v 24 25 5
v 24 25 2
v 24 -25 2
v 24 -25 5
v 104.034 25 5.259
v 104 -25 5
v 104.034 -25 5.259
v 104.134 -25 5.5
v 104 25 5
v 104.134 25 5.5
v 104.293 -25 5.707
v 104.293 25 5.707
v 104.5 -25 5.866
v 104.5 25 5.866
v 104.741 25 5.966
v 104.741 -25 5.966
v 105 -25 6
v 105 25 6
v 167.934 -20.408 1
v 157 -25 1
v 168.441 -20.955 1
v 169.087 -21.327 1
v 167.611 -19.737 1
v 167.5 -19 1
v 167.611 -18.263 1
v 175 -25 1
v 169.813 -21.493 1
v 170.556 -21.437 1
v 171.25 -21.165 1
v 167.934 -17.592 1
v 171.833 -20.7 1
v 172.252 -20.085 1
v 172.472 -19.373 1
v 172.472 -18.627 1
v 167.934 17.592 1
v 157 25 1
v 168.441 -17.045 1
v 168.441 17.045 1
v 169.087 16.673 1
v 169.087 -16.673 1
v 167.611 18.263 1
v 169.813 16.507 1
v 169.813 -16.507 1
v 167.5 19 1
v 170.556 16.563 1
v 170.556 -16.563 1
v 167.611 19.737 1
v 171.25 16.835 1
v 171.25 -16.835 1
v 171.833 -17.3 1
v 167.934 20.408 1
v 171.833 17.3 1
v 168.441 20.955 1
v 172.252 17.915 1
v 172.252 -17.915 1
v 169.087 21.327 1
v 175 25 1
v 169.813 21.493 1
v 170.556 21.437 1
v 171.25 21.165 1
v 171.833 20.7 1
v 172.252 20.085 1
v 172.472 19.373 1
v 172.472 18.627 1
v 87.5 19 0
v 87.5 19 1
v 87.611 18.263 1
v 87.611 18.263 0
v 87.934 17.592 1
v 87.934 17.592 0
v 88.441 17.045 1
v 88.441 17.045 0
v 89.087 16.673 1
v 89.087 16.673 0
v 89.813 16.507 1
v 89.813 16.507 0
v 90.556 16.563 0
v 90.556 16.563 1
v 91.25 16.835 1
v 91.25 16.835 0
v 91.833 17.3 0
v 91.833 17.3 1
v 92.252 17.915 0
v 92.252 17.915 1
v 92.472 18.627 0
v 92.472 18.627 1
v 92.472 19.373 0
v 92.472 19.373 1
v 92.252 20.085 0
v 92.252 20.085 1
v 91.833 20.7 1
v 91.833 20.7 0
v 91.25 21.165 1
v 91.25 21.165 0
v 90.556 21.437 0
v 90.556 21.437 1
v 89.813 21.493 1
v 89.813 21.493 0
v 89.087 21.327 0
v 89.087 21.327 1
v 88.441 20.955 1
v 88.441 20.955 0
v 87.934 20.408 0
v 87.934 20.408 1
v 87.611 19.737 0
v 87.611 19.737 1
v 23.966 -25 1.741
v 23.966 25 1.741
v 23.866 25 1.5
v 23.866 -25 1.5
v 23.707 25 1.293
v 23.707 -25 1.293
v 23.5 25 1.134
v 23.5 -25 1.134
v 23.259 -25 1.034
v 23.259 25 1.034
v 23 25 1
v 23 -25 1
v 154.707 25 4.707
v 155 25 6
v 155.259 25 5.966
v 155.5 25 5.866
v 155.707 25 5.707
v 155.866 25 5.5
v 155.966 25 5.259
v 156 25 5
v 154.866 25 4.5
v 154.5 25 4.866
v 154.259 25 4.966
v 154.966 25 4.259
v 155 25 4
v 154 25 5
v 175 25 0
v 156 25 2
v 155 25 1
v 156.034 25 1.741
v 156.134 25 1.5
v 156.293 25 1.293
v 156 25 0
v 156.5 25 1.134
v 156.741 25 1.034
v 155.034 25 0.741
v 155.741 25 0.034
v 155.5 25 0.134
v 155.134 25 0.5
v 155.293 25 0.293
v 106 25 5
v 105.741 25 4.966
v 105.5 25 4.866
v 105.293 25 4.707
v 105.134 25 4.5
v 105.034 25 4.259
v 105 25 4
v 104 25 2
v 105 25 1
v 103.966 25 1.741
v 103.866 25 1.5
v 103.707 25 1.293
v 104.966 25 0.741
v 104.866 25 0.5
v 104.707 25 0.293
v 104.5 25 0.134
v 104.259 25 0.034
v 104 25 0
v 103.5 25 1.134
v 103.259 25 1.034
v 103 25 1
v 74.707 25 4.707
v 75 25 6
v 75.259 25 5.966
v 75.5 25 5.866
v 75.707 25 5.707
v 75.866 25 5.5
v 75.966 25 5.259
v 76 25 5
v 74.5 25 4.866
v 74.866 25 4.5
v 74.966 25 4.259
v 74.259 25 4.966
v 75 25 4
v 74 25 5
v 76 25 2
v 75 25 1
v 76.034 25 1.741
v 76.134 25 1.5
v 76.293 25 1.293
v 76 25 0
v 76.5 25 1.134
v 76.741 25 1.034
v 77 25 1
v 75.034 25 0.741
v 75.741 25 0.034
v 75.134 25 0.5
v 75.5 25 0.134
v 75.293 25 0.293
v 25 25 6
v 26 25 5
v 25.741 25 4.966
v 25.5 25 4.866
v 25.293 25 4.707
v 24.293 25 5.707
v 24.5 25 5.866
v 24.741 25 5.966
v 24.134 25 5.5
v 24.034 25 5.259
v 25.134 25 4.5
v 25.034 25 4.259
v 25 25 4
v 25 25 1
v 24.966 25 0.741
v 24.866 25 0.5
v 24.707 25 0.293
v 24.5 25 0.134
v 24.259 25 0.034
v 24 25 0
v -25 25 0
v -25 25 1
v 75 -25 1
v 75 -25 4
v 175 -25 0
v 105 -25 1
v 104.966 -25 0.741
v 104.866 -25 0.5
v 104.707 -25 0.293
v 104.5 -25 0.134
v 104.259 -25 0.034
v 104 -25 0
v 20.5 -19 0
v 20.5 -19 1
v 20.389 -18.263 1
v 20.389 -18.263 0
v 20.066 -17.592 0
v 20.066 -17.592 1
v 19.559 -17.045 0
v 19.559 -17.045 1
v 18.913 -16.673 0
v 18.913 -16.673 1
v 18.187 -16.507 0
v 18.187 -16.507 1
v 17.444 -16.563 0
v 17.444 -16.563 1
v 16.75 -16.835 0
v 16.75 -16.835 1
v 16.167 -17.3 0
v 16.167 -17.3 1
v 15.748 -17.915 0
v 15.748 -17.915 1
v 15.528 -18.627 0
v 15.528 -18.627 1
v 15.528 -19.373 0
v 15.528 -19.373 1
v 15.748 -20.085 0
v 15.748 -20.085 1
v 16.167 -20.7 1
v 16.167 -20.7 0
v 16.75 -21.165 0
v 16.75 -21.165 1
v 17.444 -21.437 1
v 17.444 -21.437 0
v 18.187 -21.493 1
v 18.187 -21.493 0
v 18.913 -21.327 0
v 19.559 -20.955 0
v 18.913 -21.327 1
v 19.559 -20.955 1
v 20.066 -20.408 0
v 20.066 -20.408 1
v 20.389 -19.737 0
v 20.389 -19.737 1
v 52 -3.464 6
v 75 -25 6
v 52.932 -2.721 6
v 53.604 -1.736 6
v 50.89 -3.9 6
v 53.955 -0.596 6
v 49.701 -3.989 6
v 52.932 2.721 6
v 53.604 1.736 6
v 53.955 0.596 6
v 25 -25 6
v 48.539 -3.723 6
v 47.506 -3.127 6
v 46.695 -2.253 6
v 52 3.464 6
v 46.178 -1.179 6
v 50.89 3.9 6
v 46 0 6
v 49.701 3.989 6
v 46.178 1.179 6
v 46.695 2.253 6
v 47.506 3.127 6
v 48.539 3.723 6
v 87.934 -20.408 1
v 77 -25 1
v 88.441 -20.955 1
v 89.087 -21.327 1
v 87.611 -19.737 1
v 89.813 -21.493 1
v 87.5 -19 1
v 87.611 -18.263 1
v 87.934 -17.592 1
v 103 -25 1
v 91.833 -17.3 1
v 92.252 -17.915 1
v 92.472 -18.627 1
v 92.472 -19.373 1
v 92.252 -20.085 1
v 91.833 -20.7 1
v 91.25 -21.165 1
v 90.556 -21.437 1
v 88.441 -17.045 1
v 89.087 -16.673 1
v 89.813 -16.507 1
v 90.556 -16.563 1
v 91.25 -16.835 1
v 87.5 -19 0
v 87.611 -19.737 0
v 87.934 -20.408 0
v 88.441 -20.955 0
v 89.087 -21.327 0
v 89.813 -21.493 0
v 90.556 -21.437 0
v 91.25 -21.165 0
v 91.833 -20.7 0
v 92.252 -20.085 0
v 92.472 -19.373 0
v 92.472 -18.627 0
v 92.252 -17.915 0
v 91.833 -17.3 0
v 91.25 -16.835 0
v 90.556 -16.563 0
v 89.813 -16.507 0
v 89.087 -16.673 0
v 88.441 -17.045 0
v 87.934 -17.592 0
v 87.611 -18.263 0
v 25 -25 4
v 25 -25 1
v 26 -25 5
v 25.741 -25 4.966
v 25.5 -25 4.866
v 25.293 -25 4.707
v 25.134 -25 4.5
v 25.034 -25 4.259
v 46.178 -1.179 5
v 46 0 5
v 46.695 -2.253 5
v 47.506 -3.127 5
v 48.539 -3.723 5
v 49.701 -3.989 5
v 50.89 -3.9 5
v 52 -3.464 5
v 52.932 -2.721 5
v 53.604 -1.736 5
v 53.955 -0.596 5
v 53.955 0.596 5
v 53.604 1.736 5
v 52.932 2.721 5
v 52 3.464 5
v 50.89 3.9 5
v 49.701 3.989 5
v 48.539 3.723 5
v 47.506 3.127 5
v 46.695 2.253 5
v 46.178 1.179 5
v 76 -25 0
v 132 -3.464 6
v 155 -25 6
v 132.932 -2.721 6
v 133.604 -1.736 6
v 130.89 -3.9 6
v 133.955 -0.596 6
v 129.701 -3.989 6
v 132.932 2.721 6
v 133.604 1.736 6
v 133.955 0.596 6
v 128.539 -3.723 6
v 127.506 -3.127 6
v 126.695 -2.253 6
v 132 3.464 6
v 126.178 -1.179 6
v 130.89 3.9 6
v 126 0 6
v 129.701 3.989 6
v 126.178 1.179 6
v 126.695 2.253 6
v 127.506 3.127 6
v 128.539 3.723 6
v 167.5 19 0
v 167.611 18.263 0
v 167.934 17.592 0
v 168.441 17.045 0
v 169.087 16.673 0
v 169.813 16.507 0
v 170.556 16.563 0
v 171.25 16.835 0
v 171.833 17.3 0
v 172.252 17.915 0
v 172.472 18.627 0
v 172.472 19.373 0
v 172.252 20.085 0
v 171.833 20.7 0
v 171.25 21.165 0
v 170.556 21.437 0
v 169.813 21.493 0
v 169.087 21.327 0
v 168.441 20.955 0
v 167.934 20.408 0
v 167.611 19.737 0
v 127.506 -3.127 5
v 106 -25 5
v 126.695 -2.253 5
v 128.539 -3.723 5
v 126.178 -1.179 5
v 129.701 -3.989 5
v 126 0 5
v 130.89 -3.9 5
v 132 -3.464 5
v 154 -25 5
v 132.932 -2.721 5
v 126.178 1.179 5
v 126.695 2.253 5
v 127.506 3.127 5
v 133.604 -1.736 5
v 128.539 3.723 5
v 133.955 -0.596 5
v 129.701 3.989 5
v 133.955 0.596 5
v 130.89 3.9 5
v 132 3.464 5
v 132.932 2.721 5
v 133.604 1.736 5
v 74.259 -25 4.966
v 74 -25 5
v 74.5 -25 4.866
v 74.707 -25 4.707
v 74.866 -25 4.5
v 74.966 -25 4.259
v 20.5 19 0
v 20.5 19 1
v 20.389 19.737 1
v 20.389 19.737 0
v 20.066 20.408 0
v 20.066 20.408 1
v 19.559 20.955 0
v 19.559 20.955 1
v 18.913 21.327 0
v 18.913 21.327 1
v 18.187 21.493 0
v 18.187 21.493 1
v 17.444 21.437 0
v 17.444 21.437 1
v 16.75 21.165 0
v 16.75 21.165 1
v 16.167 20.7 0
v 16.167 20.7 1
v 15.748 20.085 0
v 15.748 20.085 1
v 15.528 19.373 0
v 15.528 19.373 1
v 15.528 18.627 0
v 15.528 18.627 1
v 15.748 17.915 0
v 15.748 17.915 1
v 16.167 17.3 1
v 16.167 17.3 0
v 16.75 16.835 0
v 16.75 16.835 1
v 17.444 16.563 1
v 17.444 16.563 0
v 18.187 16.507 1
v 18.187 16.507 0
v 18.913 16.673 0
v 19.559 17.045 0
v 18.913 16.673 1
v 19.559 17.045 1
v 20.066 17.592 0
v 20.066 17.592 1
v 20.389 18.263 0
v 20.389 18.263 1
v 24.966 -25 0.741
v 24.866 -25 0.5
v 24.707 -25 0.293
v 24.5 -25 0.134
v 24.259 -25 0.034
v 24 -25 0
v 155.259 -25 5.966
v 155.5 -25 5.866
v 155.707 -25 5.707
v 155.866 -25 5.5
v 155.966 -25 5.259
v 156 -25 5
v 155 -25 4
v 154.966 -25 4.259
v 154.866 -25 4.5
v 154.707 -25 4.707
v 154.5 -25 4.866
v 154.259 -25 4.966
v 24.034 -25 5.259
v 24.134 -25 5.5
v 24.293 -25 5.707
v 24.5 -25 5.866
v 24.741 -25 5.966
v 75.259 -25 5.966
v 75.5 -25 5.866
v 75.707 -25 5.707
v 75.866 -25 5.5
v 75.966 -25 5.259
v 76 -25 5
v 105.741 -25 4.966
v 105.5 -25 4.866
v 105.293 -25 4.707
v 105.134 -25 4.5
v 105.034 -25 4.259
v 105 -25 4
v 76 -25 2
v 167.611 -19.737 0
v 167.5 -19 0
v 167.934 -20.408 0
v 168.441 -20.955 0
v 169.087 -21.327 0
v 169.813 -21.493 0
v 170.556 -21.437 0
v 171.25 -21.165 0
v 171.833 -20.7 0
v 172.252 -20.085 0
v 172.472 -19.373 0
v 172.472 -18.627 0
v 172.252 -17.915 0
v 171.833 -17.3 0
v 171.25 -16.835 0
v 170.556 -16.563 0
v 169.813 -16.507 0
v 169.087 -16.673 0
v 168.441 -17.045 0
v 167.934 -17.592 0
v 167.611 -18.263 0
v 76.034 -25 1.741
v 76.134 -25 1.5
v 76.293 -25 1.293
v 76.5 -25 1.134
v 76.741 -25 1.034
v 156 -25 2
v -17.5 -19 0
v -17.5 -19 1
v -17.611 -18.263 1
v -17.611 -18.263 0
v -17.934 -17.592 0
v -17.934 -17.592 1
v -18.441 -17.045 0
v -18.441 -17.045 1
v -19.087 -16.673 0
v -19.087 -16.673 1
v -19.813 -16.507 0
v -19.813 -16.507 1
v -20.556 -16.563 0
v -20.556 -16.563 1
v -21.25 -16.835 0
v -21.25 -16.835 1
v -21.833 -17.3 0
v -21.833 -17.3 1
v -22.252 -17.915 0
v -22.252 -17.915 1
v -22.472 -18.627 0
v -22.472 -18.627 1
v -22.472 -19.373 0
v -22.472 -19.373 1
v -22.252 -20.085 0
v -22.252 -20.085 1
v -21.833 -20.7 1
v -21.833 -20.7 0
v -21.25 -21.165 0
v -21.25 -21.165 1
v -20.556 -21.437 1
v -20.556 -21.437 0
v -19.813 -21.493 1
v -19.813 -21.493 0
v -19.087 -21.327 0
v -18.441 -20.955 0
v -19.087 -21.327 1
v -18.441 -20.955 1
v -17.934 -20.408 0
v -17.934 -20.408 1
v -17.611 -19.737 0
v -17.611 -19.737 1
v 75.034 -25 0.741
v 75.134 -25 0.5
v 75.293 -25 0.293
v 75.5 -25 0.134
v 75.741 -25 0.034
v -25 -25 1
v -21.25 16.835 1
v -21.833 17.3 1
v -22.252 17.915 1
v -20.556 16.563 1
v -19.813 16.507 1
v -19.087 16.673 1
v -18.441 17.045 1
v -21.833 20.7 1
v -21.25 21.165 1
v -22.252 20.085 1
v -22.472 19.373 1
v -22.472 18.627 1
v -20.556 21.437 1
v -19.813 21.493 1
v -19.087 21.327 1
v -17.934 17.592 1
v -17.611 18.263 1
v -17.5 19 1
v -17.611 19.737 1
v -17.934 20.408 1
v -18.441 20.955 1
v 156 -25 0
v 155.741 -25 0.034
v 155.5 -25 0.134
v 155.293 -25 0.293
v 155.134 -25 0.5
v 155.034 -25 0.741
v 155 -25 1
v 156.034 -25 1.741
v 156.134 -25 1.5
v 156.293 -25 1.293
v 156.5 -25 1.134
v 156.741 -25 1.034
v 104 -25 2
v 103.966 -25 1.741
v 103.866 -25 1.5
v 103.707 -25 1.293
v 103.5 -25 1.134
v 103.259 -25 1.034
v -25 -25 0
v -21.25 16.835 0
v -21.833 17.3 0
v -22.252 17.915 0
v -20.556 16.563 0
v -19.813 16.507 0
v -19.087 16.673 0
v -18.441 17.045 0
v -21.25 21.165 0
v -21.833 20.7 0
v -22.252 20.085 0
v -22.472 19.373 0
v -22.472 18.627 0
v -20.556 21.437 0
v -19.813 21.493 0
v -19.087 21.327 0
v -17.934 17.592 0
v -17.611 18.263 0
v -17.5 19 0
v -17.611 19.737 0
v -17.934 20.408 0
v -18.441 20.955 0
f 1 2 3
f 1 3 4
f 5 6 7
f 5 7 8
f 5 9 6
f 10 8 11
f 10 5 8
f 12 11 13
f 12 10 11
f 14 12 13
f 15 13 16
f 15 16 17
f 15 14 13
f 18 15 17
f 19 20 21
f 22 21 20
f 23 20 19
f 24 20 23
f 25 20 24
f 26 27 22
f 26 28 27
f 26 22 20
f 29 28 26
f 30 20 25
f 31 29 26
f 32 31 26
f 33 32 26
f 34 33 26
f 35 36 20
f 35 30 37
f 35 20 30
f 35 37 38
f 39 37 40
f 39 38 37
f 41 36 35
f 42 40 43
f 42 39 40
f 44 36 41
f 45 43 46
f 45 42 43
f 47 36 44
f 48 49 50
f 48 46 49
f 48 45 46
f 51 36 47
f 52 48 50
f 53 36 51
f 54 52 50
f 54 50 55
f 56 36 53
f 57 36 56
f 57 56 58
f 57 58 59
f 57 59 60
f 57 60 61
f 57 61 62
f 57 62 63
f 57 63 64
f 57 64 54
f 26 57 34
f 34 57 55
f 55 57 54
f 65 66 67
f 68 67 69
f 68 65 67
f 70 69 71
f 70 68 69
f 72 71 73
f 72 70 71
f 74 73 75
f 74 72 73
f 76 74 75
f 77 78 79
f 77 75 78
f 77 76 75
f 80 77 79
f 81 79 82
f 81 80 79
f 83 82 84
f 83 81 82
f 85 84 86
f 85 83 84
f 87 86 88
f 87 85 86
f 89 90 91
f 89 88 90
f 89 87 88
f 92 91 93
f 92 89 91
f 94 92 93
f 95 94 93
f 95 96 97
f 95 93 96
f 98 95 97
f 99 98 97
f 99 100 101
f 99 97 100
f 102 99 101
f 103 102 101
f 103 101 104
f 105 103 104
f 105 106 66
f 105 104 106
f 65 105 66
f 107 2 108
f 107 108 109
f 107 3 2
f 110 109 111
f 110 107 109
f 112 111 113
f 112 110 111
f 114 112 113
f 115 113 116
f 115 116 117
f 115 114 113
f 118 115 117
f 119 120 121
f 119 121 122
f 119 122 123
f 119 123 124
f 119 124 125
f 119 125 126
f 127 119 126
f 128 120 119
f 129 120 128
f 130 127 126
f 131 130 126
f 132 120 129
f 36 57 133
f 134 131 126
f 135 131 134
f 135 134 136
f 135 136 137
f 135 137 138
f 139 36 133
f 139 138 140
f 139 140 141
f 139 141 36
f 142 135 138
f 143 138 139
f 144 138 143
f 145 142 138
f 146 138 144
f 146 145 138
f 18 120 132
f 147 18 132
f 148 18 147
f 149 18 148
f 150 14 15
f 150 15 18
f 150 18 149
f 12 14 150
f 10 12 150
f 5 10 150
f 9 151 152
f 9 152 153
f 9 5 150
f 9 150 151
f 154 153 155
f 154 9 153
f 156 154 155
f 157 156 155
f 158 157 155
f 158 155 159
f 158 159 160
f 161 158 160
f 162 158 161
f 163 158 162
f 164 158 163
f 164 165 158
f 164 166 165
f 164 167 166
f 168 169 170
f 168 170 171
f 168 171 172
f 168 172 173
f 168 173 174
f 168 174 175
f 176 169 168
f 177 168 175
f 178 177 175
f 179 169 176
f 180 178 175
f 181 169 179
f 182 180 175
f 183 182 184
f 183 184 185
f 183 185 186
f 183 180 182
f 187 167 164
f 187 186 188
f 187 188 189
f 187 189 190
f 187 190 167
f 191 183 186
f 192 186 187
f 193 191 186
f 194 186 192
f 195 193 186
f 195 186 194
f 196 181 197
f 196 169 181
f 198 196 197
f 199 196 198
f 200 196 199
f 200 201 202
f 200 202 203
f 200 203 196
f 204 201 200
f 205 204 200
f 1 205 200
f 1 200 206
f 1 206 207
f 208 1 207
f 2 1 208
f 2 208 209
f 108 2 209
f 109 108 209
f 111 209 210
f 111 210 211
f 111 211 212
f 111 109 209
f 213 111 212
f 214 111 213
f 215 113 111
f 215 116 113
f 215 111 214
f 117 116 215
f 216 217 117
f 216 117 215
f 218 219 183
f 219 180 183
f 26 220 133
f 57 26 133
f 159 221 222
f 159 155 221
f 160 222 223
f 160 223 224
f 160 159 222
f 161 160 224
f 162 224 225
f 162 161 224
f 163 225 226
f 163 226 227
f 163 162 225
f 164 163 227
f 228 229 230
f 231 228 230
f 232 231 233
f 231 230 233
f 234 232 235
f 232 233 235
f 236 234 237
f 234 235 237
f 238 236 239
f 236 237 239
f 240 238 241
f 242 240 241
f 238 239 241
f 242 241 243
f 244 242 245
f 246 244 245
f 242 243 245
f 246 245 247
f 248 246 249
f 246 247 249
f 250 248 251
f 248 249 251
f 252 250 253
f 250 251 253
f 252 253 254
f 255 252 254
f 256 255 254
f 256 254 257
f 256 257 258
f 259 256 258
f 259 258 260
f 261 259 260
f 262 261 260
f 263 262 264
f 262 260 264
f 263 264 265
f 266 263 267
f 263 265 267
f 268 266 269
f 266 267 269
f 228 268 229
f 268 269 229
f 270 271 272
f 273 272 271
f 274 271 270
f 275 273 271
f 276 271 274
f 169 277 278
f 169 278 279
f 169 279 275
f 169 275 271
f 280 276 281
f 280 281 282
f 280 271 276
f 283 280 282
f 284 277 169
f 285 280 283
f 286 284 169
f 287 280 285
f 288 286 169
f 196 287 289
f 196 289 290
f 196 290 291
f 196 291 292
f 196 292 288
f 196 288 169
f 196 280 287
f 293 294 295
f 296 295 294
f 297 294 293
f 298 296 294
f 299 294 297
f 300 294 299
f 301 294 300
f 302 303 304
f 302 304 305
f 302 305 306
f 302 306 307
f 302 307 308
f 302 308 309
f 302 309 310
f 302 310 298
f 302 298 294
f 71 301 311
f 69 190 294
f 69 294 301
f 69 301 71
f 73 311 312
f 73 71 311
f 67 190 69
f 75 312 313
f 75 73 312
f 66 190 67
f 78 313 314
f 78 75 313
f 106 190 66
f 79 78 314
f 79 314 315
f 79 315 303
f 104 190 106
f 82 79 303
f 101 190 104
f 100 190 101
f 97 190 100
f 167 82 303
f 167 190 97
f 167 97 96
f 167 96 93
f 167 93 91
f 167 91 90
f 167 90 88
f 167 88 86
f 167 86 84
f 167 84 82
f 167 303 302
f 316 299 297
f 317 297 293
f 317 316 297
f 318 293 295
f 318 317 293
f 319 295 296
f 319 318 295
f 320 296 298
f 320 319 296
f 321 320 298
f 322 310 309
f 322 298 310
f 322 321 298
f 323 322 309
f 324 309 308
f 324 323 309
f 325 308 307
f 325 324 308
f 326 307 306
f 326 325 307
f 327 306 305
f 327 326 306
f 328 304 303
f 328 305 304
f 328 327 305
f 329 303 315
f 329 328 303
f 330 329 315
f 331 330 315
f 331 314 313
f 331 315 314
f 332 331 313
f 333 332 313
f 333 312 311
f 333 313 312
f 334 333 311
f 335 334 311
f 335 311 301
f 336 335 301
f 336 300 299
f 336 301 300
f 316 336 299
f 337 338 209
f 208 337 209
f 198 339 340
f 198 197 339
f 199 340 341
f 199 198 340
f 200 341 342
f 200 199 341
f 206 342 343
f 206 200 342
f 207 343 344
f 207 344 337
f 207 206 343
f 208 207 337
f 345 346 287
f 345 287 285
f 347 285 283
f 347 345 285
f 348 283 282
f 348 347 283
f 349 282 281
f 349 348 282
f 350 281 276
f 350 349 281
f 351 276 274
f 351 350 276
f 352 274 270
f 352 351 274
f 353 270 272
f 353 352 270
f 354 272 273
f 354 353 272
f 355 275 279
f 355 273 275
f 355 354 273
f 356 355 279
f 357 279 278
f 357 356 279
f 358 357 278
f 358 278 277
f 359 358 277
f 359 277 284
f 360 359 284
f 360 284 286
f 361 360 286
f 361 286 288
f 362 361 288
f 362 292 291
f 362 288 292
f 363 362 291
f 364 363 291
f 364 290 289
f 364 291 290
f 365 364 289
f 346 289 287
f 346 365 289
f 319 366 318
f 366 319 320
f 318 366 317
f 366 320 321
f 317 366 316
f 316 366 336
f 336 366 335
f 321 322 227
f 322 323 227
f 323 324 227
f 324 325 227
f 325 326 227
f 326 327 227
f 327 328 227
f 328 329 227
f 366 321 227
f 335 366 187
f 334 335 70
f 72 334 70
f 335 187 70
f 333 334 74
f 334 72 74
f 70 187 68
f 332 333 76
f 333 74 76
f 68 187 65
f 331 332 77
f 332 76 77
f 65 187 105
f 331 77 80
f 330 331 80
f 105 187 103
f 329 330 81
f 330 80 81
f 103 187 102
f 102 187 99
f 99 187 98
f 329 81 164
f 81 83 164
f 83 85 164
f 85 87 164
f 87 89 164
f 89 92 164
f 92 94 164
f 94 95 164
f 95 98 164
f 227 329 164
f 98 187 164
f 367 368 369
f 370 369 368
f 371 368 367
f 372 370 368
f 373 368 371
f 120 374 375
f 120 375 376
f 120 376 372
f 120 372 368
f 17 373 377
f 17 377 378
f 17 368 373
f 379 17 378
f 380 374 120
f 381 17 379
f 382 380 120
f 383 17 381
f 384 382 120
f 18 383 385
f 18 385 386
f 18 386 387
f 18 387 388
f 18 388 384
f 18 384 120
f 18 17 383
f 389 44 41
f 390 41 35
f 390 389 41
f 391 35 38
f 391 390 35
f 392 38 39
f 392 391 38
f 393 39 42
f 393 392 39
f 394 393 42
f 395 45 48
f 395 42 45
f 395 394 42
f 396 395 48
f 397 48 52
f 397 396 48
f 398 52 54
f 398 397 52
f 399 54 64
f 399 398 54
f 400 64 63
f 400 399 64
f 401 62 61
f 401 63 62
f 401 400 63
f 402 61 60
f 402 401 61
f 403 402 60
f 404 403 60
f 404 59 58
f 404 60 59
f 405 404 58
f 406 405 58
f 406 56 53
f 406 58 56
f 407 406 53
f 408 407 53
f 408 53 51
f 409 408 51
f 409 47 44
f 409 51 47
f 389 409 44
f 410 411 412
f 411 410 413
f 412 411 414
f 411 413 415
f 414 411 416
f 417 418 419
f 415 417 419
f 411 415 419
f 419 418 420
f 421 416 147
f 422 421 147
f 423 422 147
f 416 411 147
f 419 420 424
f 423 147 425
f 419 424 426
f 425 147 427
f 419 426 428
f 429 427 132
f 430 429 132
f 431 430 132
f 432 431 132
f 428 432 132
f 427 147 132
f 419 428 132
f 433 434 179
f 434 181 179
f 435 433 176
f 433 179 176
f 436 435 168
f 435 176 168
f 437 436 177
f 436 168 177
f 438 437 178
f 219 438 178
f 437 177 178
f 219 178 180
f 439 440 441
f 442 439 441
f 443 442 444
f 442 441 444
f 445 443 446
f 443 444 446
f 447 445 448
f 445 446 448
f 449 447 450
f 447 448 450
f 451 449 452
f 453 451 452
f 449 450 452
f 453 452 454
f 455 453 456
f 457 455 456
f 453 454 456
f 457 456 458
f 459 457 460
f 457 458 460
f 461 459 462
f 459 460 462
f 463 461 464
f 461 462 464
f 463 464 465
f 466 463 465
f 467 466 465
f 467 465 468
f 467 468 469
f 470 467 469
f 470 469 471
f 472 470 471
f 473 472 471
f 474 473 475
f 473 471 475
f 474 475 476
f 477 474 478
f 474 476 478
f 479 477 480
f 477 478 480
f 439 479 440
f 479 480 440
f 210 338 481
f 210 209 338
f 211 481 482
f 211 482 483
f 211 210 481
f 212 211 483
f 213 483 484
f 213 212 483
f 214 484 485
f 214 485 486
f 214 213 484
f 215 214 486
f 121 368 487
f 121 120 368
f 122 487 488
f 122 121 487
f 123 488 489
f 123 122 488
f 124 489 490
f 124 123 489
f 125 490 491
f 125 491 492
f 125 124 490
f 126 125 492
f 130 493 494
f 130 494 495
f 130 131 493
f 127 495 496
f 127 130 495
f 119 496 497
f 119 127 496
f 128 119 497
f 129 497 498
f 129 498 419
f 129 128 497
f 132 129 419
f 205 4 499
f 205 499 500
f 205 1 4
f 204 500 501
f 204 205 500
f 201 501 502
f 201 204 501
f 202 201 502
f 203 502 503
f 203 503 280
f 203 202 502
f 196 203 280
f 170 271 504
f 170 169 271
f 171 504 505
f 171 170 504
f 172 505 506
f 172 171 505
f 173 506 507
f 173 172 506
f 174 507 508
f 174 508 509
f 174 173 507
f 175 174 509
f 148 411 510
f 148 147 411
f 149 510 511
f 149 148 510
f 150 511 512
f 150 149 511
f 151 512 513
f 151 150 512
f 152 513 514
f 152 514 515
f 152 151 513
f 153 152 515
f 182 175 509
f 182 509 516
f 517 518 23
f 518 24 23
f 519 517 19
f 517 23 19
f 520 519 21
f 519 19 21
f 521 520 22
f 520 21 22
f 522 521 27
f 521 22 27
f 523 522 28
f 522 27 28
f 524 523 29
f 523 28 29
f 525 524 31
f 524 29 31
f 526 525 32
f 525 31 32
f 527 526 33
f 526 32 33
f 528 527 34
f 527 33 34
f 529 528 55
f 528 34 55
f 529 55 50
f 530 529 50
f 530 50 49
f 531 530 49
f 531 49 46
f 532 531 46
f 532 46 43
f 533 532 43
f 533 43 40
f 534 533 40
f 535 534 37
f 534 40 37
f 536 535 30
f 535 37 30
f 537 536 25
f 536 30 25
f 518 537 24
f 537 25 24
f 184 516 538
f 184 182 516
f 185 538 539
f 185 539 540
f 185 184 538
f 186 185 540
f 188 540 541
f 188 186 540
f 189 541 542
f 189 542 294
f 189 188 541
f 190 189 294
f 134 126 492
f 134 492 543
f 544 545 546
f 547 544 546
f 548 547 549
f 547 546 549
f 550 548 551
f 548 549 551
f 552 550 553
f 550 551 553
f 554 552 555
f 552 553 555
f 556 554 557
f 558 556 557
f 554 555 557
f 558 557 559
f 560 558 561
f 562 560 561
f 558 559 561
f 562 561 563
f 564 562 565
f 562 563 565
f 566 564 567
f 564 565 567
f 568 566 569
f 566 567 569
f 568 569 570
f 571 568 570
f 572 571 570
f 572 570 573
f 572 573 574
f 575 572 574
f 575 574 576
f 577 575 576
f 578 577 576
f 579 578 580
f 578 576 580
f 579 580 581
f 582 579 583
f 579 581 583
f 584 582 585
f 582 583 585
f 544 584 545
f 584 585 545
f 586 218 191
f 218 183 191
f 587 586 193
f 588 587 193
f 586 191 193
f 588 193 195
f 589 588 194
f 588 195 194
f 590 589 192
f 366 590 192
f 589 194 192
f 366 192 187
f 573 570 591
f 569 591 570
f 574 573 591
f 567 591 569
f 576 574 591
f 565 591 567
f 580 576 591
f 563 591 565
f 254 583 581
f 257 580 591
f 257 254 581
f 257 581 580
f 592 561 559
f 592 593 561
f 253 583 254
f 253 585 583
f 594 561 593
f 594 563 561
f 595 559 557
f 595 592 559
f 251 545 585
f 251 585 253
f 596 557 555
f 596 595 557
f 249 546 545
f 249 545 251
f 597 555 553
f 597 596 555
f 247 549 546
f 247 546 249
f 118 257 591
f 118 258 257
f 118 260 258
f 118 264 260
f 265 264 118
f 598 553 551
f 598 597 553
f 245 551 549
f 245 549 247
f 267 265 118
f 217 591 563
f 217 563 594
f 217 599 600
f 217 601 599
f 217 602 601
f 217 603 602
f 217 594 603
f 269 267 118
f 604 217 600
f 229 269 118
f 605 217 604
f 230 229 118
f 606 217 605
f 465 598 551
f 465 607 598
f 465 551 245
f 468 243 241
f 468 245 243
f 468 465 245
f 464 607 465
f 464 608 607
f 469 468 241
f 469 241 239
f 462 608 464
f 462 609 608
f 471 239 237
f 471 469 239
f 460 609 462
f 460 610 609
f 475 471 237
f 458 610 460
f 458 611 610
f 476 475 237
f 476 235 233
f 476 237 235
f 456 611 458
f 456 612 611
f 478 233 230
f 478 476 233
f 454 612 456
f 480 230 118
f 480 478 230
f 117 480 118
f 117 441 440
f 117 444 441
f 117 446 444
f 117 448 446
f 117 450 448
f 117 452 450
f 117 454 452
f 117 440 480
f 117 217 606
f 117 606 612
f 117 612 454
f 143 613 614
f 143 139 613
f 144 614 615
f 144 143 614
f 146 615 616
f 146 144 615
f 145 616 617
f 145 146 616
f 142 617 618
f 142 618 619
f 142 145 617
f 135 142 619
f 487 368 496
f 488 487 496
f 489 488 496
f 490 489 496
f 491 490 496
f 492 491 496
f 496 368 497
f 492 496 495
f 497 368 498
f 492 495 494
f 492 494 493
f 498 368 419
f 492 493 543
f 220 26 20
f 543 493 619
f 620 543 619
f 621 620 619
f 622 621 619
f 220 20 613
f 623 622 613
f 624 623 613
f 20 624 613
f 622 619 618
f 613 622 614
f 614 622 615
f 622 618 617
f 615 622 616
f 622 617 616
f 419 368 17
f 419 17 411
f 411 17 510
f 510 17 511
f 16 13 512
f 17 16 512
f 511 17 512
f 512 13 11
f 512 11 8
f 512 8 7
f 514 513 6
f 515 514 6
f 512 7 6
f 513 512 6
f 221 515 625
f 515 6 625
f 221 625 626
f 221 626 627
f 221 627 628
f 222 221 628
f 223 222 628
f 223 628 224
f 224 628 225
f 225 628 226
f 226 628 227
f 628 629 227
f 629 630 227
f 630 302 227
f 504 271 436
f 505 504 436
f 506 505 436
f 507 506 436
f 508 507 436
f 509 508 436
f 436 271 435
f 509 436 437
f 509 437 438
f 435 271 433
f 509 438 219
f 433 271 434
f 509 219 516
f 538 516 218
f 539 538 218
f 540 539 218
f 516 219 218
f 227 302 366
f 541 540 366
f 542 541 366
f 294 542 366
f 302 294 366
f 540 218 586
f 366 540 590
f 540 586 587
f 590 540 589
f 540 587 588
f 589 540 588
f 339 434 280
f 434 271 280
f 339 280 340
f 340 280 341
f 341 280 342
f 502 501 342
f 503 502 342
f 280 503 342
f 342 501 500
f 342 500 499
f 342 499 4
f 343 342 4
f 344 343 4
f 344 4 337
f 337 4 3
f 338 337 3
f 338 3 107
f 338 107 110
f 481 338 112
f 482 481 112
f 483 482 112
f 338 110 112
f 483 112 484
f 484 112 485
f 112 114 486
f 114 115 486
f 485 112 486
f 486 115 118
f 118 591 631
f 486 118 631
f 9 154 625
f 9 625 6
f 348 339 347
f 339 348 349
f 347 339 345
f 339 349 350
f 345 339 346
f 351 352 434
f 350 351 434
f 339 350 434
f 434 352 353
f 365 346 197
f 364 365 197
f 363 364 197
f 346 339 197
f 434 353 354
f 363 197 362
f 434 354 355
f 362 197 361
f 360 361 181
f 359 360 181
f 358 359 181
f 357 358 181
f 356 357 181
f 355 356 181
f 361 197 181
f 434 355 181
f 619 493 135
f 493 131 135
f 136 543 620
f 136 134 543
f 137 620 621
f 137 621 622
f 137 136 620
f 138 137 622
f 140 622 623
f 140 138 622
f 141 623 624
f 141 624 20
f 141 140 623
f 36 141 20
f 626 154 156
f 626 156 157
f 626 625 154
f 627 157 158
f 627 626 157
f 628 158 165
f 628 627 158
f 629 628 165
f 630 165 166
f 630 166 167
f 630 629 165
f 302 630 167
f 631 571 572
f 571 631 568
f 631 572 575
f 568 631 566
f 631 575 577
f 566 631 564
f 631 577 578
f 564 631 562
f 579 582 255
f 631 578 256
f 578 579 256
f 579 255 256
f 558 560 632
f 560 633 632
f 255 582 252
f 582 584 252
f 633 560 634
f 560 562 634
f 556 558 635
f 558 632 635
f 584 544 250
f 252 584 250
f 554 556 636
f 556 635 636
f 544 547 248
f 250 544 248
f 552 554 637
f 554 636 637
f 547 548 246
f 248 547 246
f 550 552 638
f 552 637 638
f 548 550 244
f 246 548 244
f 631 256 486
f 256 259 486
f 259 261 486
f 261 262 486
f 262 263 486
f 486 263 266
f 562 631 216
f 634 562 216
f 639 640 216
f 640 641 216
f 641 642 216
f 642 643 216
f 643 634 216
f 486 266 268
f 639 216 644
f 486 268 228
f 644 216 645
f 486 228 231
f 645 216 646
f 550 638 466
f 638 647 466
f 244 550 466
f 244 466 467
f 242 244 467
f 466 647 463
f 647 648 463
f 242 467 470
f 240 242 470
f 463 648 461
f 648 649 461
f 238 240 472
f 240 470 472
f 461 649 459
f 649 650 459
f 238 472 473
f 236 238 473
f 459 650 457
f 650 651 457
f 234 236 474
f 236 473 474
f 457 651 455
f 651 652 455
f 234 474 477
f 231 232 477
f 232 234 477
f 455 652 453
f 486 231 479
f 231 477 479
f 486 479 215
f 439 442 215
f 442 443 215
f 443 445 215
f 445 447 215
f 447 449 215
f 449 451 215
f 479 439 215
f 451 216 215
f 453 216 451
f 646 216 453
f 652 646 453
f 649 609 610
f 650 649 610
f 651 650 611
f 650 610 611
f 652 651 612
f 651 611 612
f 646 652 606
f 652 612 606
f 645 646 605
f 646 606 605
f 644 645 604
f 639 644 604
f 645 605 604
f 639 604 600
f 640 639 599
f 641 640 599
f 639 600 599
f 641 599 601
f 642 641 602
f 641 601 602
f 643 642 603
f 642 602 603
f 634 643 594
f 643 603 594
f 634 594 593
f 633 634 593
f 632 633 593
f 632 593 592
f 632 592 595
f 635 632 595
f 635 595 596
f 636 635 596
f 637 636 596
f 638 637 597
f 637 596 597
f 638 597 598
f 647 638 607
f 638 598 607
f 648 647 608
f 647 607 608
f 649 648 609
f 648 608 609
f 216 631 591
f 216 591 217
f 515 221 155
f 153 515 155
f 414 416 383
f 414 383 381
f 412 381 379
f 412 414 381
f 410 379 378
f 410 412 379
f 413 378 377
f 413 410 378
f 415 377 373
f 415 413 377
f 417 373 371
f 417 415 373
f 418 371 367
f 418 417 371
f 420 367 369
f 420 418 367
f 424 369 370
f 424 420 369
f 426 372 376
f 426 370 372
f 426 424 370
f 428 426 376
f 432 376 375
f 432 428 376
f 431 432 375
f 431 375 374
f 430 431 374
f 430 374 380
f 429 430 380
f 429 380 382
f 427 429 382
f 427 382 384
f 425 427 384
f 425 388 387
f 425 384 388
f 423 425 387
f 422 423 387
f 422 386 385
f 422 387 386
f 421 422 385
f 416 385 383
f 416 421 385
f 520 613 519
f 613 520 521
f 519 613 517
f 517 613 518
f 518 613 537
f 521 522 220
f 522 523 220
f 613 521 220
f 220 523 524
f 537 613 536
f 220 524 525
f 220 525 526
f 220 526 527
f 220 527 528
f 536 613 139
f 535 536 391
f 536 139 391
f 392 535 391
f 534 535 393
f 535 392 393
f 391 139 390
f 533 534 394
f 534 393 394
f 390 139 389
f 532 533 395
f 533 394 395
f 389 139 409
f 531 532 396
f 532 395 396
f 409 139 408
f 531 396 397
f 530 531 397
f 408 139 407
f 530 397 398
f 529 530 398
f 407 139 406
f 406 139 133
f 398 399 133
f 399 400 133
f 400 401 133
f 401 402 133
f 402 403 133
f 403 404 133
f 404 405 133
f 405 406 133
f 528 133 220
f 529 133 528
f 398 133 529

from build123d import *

# Parameters (mm, degrees)
SKETCH1_W           = 50
SKETCH1_H           = 50
BOSS_EXTRUDE1_DEPTH = 1
BOSS_EXTRUDE2_START = 5
SKETCH2_W           = 50
SKETCH2_H           = 50
BOSS_EXTRUDE2_DEPTH = 1
SKETCH3_W           = 30
SKETCH3_H           = 50
BOSS_EXTRUDE3_DEPTH = 1
BOSS_EXTRUDE4_START = 5
SKETCH4_W           = 50
SKETCH4_H           = 50
BOSS_EXTRUDE4_DEPTH = 1
SKETCH5_W           = 20
SKETCH5_H           = 50
BOSS_EXTRUDE5_DEPTH = 1
SKETCH6_W           = 6
SKETCH6_H           = 50
BOSS_EXTRUDE6_DEPTH = 1
SKETCH7_W           = 6
SKETCH7_H           = 50
BOSS_EXTRUDE7_DEPTH = 1
SKETCH8_W           = 6
SKETCH8_H           = 50
BOSS_EXTRUDE8_DEPTH = 1
SKETCH9_W           = 6
SKETCH9_H           = 50
BOSS_EXTRUDE9_DEPTH = 1
FILLET1_R           = 1
FILLET2_R           = 1
FILLET3_R           = 1
FILLET4_R           = 1
FILLET5_R           = 1
FILLET6_R           = 1
FILLET7_R           = 1
FILLET8_R           = 1
FILLET9_R           = 1
FILLET10_R          = 1
FILLET11_R          = 1
FILLET12_R          = 1
FILLET13_R          = 1
FILLET14_R          = 1
FILLET15_R          = 1
FILLET16_R          = 1
SKETCH10_R          = 2.5
CUT_EXTRUDE1_DEPTH  = 1
SKETCH11_R          = 4
SKETCH11_R_2        = 2.5
CUT_EXTRUDE7_DEPTH  = 50.5


with BuildPart() as part:
    # Sketch1 → Boss-Extrude1 (new body)
    with BuildSketch(Plane.XY):
        Rectangle(SKETCH1_W, SKETCH1_H)
    extrude(amount=BOSS_EXTRUDE1_DEPTH)



with BuildPart() as body_2:
    # Sketch2 → Boss-Extrude2 (new body)
    with BuildSketch(Plane.XY.offset(BOSS_EXTRUDE2_START)):
        with Locations((50, 0)):
            Rectangle(SKETCH2_W, SKETCH2_H)
    extrude(amount=BOSS_EXTRUDE2_DEPTH)


with BuildPart() as body_3:
    # Sketch3 → Boss-Extrude3 (new body)
    with BuildSketch(Plane.XY):
        with Locations((90, 0)):
            Rectangle(SKETCH3_W, SKETCH3_H)
    extrude(amount=BOSS_EXTRUDE3_DEPTH)


with BuildPart() as body_4:
    # Sketch4 → Boss-Extrude4 (new body)
    with BuildSketch(Plane.XY.offset(BOSS_EXTRUDE4_START)):
        with Locations((130, 0)):
            Rectangle(SKETCH4_W, SKETCH4_H)
    extrude(amount=BOSS_EXTRUDE4_DEPTH)


with BuildPart() as body_5:
    # Sketch5 → Boss-Extrude5 (new body)
    with BuildSketch(Plane.XY):
        with Locations((165, 0)):
            Rectangle(SKETCH5_W, SKETCH5_H)
    extrude(amount=BOSS_EXTRUDE5_DEPTH)


with BuildPart() as part_1:
    add(part.part)

    add(body_2.part)  # Boss-Extrude6 merges body 2
    # Sketch6 → Boss-Extrude6 (add)
    with BuildSketch(Plane.ZY.offset(-25)):
        with Locations((3, 0)):
            Rectangle(SKETCH6_W, SKETCH6_H)
    extrude(amount=BOSS_EXTRUDE6_DEPTH)


    add(body_3.part)  # Boss-Extrude7 merges body 3
    # Sketch7 → Boss-Extrude7 (add)
    with BuildSketch(Plane(origin=(75, 0, 0), x_dir=(0, 0, -1), z_dir=(1, 0, 0))):
        with Locations((-3, 0)):
            Rectangle(SKETCH7_W, SKETCH7_H)
    extrude(amount=BOSS_EXTRUDE7_DEPTH)


    add(body_4.part)  # Boss-Extrude8 merges body 4
    # Sketch8 → Boss-Extrude8 (add)
    with BuildSketch(Plane.ZY.offset(-105)):
        with Locations((3, 0)):
            Rectangle(SKETCH8_W, SKETCH8_H)
    extrude(amount=BOSS_EXTRUDE8_DEPTH)


    add(body_5.part)  # Boss-Extrude9 merges body 5
    # Sketch9 → Boss-Extrude9 (add)
    with BuildSketch(Plane(origin=(155, 0, 0), x_dir=(0, 0, -1), z_dir=(1, 0, 0))):
        with Locations((-3, 0)):
            Rectangle(SKETCH9_W, SKETCH9_H)
    extrude(amount=BOSS_EXTRUDE9_DEPTH)

    # Fillet1
    fillet1_edges = [part_1.edges().sort_by_distance(p)[0] for p in [
        (24, 0, 1),
    ]]
    fillet(fillet1_edges, radius=FILLET1_R)

    # Fillet2
    fillet2_edges = [part_1.edges().sort_by_distance(p)[0] for p in [
        (24, 0, 6),
    ]]
    fillet(fillet2_edges, radius=FILLET2_R)

    # Fillet3
    fillet3_edges = [part_1.edges().sort_by_distance(p)[0] for p in [
        (76, 0, 6),
    ]]
    fillet(fillet3_edges, radius=FILLET3_R)

    # Fillet4
    fillet4_edges = [part_1.edges().sort_by_distance(p)[0] for p in [
        (76, 0, 1),
    ]]
    fillet(fillet4_edges, radius=FILLET4_R)

    # Fillet5
    fillet5_edges = [part_1.edges().sort_by_distance(p)[0] for p in [
        (104, 0, 6),
    ]]
    fillet(fillet5_edges, radius=FILLET5_R)

    # Fillet6
    fillet6_edges = [part_1.edges().sort_by_distance(p)[0] for p in [
        (104, 0, 1),
    ]]
    fillet(fillet6_edges, radius=FILLET6_R)

    # Fillet7
    fillet7_edges = [part_1.edges().sort_by_distance(p)[0] for p in [
        (156, 0, 6),
    ]]
    fillet(fillet7_edges, radius=FILLET7_R)

    # Fillet8
    fillet8_edges = [part_1.edges().sort_by_distance(p)[0] for p in [
        (156, 0, 1),
    ]]
    fillet(fillet8_edges, radius=FILLET8_R)

    # Fillet9
    fillet9_edges = [part_1.edges().sort_by_distance(p)[0] for p in [
        (155, 0, 0),
    ]]
    fillet(fillet9_edges, radius=FILLET9_R)

    # Fillet10
    fillet10_edges = [part_1.edges().sort_by_distance(p)[0] for p in [
        (155, 0, 5),
    ]]
    fillet(fillet10_edges, radius=FILLET10_R)

    # Fillet11
    fillet11_edges = [part_1.edges().sort_by_distance(p)[0] for p in [
        (105, 0, 5),
    ]]
    fillet(fillet11_edges, radius=FILLET11_R)

    # Fillet12
    fillet12_edges = [part_1.edges().sort_by_distance(p)[0] for p in [
        (105, 0, 0),
    ]]
    fillet(fillet12_edges, radius=FILLET12_R)

    # Fillet13
    fillet13_edges = [part_1.edges().sort_by_distance(p)[0] for p in [
        (25, 0, 5),
    ]]
    fillet(fillet13_edges, radius=FILLET13_R)

    # Fillet14
    fillet14_edges = [part_1.edges().sort_by_distance(p)[0] for p in [
        (25, 0, 0),
    ]]
    fillet(fillet14_edges, radius=FILLET14_R)

    # Fillet15
    fillet15_edges = [part_1.edges().sort_by_distance(p)[0] for p in [
        (75, 0, 5),
    ]]
    fillet(fillet15_edges, radius=FILLET15_R)

    # Fillet16
    fillet16_edges = [part_1.edges().sort_by_distance(p)[0] for p in [
        (75, 0, 0),
    ]]
    fillet(fillet16_edges, radius=FILLET16_R)

    # Sketch10 → Cut-Extrude1 (cut)
    with BuildSketch(Plane.XY.offset(1)):
        with Locations((-20, 19)):
            Circle(SKETCH10_R)
        with Locations((-20, -19)):
            Circle(SKETCH10_R)
        with Locations((18, -19)):
            Circle(SKETCH10_R)
        with Locations((18, 19)):
            Circle(SKETCH10_R)
    extrude(amount=-CUT_EXTRUDE1_DEPTH, mode=Mode.SUBTRACT)

    # Sketch11 → Cut-Extrude7 (cut, symmetric)
    with BuildSketch(Plane.XY):
        with Locations(Location((50, 0, 0), (0, 0, 180))):
            Circle(SKETCH11_R)
        with Locations(Location((130, 0, 0), (0, 0, 180))):
            Circle(SKETCH11_R)
        with Locations(Location((90, 19, 0), (0, 0, 180))):
            Circle(SKETCH11_R_2)
        with Locations(Location((90, -19, 0), (0, 0, 180))):
            Circle(SKETCH11_R_2)
        with Locations(Location((170, 19, 0), (0, 0, 180))):
            Circle(SKETCH11_R_2)
        with Locations(Location((170, -19, 0), (0, 0, 180))):
            Circle(SKETCH11_R_2)
    extrude(amount=CUT_EXTRUDE7_DEPTH, both=True, mode=Mode.SUBTRACT)


solid = part_1.part
